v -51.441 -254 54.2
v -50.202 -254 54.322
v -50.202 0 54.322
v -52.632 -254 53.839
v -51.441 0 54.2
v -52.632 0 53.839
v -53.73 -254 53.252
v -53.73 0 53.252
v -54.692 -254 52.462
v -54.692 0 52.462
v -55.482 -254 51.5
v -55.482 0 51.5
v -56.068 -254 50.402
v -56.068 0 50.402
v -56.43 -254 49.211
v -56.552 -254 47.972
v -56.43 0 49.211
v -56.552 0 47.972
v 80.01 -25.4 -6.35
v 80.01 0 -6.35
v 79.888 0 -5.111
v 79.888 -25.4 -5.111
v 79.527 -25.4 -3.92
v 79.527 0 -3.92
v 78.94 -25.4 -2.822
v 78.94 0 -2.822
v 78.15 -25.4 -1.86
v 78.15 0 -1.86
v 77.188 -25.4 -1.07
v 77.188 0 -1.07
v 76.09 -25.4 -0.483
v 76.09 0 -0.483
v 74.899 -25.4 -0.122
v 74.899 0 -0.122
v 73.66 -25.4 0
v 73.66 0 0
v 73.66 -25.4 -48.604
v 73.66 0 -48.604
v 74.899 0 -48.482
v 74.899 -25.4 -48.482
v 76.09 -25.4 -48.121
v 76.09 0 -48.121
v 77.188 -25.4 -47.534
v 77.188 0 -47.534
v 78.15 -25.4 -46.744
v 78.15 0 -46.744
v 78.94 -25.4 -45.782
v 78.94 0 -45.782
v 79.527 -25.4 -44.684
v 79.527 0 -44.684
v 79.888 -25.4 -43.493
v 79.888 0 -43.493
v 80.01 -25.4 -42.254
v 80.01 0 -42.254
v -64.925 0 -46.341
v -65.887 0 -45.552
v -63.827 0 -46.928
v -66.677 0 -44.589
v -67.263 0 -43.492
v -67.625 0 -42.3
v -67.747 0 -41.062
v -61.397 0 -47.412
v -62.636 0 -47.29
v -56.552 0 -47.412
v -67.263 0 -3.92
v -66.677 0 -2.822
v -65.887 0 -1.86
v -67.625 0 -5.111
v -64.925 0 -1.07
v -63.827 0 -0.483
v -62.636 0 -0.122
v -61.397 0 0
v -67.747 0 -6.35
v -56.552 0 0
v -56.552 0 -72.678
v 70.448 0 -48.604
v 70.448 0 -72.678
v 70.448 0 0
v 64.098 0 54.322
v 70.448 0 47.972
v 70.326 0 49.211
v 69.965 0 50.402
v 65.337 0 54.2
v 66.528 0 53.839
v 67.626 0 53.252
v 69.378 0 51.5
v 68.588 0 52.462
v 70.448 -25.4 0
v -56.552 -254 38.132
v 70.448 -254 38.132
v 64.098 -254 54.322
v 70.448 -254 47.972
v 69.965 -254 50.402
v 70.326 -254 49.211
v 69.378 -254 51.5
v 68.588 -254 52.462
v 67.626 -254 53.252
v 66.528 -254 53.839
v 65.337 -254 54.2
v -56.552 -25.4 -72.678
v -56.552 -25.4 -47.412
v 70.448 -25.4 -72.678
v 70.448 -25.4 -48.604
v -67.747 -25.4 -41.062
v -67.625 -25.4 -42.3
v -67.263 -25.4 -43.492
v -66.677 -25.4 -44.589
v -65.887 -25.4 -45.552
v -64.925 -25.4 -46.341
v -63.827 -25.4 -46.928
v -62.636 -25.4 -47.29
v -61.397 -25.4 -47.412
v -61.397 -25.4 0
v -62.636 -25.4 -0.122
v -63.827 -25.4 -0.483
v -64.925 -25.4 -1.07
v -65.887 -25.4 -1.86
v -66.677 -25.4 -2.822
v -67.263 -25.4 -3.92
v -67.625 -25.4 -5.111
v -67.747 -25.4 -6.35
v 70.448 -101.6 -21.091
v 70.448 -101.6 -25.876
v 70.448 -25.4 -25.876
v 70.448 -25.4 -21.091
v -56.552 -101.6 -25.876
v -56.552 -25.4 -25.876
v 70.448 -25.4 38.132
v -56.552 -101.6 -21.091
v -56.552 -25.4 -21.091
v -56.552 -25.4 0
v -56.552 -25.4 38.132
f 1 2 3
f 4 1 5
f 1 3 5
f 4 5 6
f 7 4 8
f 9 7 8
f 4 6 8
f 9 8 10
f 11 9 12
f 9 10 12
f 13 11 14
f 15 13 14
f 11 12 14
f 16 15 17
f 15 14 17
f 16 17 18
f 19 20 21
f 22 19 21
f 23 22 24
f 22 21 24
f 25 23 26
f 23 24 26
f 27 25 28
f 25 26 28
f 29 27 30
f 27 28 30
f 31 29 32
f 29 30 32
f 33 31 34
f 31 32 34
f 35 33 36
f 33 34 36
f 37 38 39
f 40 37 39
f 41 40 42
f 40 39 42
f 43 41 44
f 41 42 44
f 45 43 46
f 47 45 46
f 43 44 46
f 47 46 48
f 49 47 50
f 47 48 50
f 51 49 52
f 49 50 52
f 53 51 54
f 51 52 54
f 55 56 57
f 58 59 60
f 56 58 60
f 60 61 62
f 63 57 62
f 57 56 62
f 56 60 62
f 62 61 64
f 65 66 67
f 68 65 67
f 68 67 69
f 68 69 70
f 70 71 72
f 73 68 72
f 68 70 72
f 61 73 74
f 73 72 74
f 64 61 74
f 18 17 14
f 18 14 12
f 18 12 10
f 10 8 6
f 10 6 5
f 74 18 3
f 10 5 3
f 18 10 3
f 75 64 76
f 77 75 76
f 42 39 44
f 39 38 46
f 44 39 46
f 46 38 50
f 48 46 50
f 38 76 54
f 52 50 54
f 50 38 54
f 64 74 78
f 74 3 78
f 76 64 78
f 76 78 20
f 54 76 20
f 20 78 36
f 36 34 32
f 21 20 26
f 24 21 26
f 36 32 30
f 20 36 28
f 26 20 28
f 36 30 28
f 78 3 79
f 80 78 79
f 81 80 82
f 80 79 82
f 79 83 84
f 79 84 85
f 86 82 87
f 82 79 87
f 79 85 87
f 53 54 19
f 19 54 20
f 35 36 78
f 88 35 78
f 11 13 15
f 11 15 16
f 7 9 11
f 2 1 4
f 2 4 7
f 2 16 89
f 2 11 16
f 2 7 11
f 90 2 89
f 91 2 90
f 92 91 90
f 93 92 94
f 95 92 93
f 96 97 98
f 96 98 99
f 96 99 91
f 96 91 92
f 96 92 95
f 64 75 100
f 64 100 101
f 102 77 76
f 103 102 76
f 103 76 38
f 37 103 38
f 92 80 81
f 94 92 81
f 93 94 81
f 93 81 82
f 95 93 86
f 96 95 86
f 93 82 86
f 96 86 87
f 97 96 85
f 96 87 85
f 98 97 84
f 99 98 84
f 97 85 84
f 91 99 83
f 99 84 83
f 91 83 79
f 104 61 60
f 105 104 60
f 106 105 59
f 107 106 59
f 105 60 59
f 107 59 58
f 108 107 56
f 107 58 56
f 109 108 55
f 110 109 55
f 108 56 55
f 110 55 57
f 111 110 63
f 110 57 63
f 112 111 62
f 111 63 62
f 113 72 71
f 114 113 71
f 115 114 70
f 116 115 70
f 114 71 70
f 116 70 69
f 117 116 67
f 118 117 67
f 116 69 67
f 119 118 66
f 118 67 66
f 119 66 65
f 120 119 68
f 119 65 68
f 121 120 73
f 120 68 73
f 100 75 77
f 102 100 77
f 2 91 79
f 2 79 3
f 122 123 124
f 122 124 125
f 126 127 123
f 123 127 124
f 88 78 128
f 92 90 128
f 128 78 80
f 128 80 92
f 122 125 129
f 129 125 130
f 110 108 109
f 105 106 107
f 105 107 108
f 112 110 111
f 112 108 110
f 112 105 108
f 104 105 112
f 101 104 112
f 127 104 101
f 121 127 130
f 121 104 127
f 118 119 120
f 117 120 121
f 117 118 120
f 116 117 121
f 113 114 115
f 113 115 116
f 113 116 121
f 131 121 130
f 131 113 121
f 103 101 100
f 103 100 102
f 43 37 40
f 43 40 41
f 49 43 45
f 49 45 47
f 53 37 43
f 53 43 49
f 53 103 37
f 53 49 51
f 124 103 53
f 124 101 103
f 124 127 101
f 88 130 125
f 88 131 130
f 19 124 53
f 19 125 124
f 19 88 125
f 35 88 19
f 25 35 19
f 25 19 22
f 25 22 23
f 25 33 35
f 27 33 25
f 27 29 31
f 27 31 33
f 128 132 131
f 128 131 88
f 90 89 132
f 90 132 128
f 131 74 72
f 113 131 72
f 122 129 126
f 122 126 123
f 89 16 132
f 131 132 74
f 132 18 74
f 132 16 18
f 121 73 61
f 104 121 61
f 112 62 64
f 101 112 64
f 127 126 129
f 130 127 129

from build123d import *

# Parameters (mm, degrees)
F1_DEPTH  = 12.7
F0_W      = 63.5
F0_H      = 4.7856457531
F2_DEPTH  = 101.6
F3_DEPTH  = 254
F1_FACE_W = 127
F1_FACE_H = 46.801686123
F4_DEPTH  = 2.54
F6_DEPTH  = 25.4


# Not quite as in the source:
# - a feature of the source that left no trace in its solid (it failed there, or was rolled back) is left out


with BuildPart() as f1:
    # F0 (on Front) → F1 (new body)
    with BuildSketch(Plane.XZ):
        Polygon((6.9482082725, -25.8761684795), (-56.5517917275, -25.8761684795), (-56.5517917275, -47.4115650554), (-56.5517917275, -72.6778546025), (6.9482082725, -72.6778546025), align=None)
        Polygon((70.4482082725, -25.8761684795), (6.9482082725, -25.8761684795), (6.9482082725, -72.6778546025), (70.4482082725, -72.6778546025), (70.4482082725, -48.604208976), align=None)
    extrude(amount=F1_DEPTH)

    # F0 (on Front) → F2 (join)
    with BuildSketch(Plane.XZ):
        with Locations((-24.8017917275, -23.4833456029)):
            Rectangle(F0_W, F0_H)
        with Locations((38.6982082725, -23.4833456029)):
            Rectangle(F0_W, F0_H)
    extrude(amount=F2_DEPTH)

    # F0 (on Front) + F1_face (on face) → F4 (join)
    with BuildSketch(Plane.XZ):
        with BuildLine():
            Line((73.6600043416, 0), (70.4482082725, 0))
            Line((70.4482082725, 0), (70.4482082725, -21.0905227264))
            Line((70.4482082725, -21.0905227264), (70.4482082725, -25.8761684795))
            Line((70.4482082725, -25.8761684795), (70.4482082725, -48.604208976))
            Line((70.4482082725, -48.604208976), (73.6600043416, -48.604208976))
            ThreePointArc((73.6600043416, -48.604208976), (78.1501324021, -46.7443370366), (80.0100043416, -42.254208976))
            Line((80.0100043416, -42.254208976), (80.0100043416, -6.35))
            ThreePointArc((80.0100043416, -6.35), (78.1501324021, -1.8598719395), (73.6600043416, 0))
        make_face()
        with BuildLine():
            Line((-56.5517917275, -21.0905227264), (-56.5517917275, 0))
            Line((-56.5517917275, 0), (-61.3967882633, 0))
            ThreePointArc((-61.3967882633, 0), (-65.8869163239, -1.8598719395), (-67.7467882633, -6.35))
            Line((-67.7467882633, -6.35), (-67.7467882633, -41.0615650554))
            ThreePointArc((-67.7467882633, -41.0615650554), (-65.8869163239, -45.551693116), (-61.3967882633, -47.4115650554))
            Line((-61.3967882633, -47.4115650554), (-56.5517917275, -47.4115650554))
            Line((-56.5517917275, -47.4115650554), (-56.5517917275, -25.8761684795))
            Line((-56.5517917275, -25.8761684795), (-56.5517917275, -21.0905227264))
        make_face()
    with BuildSketch(Plane(origin=(6.9482082725, -12.7, -49.277011541), x_dir=(1, 0, 0), z_dir=(0, -1, 0))):
        Rectangle(F1_FACE_W, F1_FACE_H)
    extrude(amount=F4_DEPTH)



with BuildPart() as f3:
    # F0 (on Front) → F3 (new body)
    with BuildSketch(Plane.XZ):
        with BuildLine():
            ThreePointArc((-50.2017917275, 54.3221453975), (-54.6919197881, 52.462273458), (-56.5517917275, 47.9721453975))
            Line((-56.5517917275, 47.9721453975), (-56.5517917275, 38.1318327586))
            Line((-56.5517917275, 38.1318327586), (70.4482082725, 38.1318327586))
            Line((70.4482082725, 38.1318327586), (70.4482082725, 47.9721453975))
            ThreePointArc((70.4482082725, 47.9721453975), (68.588336333, 52.462273458), (64.0982082725, 54.3221453975))
            Line((64.0982082725, 54.3221453975), (-50.2017917275, 54.3221453975))
        make_face()
    extrude(amount=F3_DEPTH)


with BuildPart() as f1_1:
    add(f1.part)

    add(f3.part)  # F6 merges F3
    # F0 (on Front) → F6 (join)
    with BuildSketch(Plane.XZ):
        with BuildLine():
            ThreePointArc((-50.2017917275, 54.3221453975), (-54.6919197881, 52.462273458), (-56.5517917275, 47.9721453975))
            Line((-56.5517917275, 47.9721453975), (-56.5517917275, 38.1318327586))
            Line((-56.5517917275, 38.1318327586), (70.4482082725, 38.1318327586))
            Line((70.4482082725, 38.1318327586), (70.4482082725, 47.9721453975))
            ThreePointArc((70.4482082725, 47.9721453975), (68.588336333, 52.462273458), (64.0982082725, 54.3221453975))
            Line((64.0982082725, 54.3221453975), (-50.2017917275, 54.3221453975))
        make_face()
        Polygon((70.4482082725, 38.1318327586), (-56.5517917275, 38.1318327586), (-56.5517917275, 0), (-56.5517917275, -21.0905227264), (6.9482082725, -21.0905227264), (70.4482082725, -21.0905227264), (70.4482082725, 0), align=None)
        with BuildLine():
            Line((-56.5517917275, -21.0905227264), (-56.5517917275, 0))
            Line((-56.5517917275, 0), (-61.3967882633, 0))
            ThreePointArc((-61.3967882633, 0), (-65.8869163239, -1.8598719395), (-67.7467882633, -6.35))
            Line((-67.7467882633, -6.35), (-67.7467882633, -41.0615650554))
            ThreePointArc((-67.7467882633, -41.0615650554), (-65.8869163239, -45.551693116), (-61.3967882633, -47.4115650554))
            Line((-61.3967882633, -47.4115650554), (-56.5517917275, -47.4115650554))
            Line((-56.5517917275, -47.4115650554), (-56.5517917275, -25.8761684795))
            Line((-56.5517917275, -25.8761684795), (-56.5517917275, -21.0905227264))
        make_face()
        with BuildLine():
            Line((73.6600043416, 0), (70.4482082725, 0))
            Line((70.4482082725, 0), (70.4482082725, -21.0905227264))
            Line((70.4482082725, -21.0905227264), (70.4482082725, -25.8761684795))
            Line((70.4482082725, -25.8761684795), (70.4482082725, -48.604208976))
            Line((70.4482082725, -48.604208976), (73.6600043416, -48.604208976))
            ThreePointArc((73.6600043416, -48.604208976), (78.1501324021, -46.7443370366), (80.0100043416, -42.254208976))
            Line((80.0100043416, -42.254208976), (80.0100043416, -6.35))
            ThreePointArc((80.0100043416, -6.35), (78.1501324021, -1.8598719395), (73.6600043416, 0))
        make_face()
        Polygon((6.9482082725, -25.8761684795), (-56.5517917275, -25.8761684795), (-56.5517917275, -47.4115650554), (-56.5517917275, -72.6778546025), (6.9482082725, -72.6778546025), align=None)
        Polygon((70.4482082725, -25.8761684795), (6.9482082725, -25.8761684795), (6.9482082725, -72.6778546025), (70.4482082725, -72.6778546025), (70.4482082725, -48.604208976), align=None)
    extrude(amount=F6_DEPTH)


solid = f1_1.part
